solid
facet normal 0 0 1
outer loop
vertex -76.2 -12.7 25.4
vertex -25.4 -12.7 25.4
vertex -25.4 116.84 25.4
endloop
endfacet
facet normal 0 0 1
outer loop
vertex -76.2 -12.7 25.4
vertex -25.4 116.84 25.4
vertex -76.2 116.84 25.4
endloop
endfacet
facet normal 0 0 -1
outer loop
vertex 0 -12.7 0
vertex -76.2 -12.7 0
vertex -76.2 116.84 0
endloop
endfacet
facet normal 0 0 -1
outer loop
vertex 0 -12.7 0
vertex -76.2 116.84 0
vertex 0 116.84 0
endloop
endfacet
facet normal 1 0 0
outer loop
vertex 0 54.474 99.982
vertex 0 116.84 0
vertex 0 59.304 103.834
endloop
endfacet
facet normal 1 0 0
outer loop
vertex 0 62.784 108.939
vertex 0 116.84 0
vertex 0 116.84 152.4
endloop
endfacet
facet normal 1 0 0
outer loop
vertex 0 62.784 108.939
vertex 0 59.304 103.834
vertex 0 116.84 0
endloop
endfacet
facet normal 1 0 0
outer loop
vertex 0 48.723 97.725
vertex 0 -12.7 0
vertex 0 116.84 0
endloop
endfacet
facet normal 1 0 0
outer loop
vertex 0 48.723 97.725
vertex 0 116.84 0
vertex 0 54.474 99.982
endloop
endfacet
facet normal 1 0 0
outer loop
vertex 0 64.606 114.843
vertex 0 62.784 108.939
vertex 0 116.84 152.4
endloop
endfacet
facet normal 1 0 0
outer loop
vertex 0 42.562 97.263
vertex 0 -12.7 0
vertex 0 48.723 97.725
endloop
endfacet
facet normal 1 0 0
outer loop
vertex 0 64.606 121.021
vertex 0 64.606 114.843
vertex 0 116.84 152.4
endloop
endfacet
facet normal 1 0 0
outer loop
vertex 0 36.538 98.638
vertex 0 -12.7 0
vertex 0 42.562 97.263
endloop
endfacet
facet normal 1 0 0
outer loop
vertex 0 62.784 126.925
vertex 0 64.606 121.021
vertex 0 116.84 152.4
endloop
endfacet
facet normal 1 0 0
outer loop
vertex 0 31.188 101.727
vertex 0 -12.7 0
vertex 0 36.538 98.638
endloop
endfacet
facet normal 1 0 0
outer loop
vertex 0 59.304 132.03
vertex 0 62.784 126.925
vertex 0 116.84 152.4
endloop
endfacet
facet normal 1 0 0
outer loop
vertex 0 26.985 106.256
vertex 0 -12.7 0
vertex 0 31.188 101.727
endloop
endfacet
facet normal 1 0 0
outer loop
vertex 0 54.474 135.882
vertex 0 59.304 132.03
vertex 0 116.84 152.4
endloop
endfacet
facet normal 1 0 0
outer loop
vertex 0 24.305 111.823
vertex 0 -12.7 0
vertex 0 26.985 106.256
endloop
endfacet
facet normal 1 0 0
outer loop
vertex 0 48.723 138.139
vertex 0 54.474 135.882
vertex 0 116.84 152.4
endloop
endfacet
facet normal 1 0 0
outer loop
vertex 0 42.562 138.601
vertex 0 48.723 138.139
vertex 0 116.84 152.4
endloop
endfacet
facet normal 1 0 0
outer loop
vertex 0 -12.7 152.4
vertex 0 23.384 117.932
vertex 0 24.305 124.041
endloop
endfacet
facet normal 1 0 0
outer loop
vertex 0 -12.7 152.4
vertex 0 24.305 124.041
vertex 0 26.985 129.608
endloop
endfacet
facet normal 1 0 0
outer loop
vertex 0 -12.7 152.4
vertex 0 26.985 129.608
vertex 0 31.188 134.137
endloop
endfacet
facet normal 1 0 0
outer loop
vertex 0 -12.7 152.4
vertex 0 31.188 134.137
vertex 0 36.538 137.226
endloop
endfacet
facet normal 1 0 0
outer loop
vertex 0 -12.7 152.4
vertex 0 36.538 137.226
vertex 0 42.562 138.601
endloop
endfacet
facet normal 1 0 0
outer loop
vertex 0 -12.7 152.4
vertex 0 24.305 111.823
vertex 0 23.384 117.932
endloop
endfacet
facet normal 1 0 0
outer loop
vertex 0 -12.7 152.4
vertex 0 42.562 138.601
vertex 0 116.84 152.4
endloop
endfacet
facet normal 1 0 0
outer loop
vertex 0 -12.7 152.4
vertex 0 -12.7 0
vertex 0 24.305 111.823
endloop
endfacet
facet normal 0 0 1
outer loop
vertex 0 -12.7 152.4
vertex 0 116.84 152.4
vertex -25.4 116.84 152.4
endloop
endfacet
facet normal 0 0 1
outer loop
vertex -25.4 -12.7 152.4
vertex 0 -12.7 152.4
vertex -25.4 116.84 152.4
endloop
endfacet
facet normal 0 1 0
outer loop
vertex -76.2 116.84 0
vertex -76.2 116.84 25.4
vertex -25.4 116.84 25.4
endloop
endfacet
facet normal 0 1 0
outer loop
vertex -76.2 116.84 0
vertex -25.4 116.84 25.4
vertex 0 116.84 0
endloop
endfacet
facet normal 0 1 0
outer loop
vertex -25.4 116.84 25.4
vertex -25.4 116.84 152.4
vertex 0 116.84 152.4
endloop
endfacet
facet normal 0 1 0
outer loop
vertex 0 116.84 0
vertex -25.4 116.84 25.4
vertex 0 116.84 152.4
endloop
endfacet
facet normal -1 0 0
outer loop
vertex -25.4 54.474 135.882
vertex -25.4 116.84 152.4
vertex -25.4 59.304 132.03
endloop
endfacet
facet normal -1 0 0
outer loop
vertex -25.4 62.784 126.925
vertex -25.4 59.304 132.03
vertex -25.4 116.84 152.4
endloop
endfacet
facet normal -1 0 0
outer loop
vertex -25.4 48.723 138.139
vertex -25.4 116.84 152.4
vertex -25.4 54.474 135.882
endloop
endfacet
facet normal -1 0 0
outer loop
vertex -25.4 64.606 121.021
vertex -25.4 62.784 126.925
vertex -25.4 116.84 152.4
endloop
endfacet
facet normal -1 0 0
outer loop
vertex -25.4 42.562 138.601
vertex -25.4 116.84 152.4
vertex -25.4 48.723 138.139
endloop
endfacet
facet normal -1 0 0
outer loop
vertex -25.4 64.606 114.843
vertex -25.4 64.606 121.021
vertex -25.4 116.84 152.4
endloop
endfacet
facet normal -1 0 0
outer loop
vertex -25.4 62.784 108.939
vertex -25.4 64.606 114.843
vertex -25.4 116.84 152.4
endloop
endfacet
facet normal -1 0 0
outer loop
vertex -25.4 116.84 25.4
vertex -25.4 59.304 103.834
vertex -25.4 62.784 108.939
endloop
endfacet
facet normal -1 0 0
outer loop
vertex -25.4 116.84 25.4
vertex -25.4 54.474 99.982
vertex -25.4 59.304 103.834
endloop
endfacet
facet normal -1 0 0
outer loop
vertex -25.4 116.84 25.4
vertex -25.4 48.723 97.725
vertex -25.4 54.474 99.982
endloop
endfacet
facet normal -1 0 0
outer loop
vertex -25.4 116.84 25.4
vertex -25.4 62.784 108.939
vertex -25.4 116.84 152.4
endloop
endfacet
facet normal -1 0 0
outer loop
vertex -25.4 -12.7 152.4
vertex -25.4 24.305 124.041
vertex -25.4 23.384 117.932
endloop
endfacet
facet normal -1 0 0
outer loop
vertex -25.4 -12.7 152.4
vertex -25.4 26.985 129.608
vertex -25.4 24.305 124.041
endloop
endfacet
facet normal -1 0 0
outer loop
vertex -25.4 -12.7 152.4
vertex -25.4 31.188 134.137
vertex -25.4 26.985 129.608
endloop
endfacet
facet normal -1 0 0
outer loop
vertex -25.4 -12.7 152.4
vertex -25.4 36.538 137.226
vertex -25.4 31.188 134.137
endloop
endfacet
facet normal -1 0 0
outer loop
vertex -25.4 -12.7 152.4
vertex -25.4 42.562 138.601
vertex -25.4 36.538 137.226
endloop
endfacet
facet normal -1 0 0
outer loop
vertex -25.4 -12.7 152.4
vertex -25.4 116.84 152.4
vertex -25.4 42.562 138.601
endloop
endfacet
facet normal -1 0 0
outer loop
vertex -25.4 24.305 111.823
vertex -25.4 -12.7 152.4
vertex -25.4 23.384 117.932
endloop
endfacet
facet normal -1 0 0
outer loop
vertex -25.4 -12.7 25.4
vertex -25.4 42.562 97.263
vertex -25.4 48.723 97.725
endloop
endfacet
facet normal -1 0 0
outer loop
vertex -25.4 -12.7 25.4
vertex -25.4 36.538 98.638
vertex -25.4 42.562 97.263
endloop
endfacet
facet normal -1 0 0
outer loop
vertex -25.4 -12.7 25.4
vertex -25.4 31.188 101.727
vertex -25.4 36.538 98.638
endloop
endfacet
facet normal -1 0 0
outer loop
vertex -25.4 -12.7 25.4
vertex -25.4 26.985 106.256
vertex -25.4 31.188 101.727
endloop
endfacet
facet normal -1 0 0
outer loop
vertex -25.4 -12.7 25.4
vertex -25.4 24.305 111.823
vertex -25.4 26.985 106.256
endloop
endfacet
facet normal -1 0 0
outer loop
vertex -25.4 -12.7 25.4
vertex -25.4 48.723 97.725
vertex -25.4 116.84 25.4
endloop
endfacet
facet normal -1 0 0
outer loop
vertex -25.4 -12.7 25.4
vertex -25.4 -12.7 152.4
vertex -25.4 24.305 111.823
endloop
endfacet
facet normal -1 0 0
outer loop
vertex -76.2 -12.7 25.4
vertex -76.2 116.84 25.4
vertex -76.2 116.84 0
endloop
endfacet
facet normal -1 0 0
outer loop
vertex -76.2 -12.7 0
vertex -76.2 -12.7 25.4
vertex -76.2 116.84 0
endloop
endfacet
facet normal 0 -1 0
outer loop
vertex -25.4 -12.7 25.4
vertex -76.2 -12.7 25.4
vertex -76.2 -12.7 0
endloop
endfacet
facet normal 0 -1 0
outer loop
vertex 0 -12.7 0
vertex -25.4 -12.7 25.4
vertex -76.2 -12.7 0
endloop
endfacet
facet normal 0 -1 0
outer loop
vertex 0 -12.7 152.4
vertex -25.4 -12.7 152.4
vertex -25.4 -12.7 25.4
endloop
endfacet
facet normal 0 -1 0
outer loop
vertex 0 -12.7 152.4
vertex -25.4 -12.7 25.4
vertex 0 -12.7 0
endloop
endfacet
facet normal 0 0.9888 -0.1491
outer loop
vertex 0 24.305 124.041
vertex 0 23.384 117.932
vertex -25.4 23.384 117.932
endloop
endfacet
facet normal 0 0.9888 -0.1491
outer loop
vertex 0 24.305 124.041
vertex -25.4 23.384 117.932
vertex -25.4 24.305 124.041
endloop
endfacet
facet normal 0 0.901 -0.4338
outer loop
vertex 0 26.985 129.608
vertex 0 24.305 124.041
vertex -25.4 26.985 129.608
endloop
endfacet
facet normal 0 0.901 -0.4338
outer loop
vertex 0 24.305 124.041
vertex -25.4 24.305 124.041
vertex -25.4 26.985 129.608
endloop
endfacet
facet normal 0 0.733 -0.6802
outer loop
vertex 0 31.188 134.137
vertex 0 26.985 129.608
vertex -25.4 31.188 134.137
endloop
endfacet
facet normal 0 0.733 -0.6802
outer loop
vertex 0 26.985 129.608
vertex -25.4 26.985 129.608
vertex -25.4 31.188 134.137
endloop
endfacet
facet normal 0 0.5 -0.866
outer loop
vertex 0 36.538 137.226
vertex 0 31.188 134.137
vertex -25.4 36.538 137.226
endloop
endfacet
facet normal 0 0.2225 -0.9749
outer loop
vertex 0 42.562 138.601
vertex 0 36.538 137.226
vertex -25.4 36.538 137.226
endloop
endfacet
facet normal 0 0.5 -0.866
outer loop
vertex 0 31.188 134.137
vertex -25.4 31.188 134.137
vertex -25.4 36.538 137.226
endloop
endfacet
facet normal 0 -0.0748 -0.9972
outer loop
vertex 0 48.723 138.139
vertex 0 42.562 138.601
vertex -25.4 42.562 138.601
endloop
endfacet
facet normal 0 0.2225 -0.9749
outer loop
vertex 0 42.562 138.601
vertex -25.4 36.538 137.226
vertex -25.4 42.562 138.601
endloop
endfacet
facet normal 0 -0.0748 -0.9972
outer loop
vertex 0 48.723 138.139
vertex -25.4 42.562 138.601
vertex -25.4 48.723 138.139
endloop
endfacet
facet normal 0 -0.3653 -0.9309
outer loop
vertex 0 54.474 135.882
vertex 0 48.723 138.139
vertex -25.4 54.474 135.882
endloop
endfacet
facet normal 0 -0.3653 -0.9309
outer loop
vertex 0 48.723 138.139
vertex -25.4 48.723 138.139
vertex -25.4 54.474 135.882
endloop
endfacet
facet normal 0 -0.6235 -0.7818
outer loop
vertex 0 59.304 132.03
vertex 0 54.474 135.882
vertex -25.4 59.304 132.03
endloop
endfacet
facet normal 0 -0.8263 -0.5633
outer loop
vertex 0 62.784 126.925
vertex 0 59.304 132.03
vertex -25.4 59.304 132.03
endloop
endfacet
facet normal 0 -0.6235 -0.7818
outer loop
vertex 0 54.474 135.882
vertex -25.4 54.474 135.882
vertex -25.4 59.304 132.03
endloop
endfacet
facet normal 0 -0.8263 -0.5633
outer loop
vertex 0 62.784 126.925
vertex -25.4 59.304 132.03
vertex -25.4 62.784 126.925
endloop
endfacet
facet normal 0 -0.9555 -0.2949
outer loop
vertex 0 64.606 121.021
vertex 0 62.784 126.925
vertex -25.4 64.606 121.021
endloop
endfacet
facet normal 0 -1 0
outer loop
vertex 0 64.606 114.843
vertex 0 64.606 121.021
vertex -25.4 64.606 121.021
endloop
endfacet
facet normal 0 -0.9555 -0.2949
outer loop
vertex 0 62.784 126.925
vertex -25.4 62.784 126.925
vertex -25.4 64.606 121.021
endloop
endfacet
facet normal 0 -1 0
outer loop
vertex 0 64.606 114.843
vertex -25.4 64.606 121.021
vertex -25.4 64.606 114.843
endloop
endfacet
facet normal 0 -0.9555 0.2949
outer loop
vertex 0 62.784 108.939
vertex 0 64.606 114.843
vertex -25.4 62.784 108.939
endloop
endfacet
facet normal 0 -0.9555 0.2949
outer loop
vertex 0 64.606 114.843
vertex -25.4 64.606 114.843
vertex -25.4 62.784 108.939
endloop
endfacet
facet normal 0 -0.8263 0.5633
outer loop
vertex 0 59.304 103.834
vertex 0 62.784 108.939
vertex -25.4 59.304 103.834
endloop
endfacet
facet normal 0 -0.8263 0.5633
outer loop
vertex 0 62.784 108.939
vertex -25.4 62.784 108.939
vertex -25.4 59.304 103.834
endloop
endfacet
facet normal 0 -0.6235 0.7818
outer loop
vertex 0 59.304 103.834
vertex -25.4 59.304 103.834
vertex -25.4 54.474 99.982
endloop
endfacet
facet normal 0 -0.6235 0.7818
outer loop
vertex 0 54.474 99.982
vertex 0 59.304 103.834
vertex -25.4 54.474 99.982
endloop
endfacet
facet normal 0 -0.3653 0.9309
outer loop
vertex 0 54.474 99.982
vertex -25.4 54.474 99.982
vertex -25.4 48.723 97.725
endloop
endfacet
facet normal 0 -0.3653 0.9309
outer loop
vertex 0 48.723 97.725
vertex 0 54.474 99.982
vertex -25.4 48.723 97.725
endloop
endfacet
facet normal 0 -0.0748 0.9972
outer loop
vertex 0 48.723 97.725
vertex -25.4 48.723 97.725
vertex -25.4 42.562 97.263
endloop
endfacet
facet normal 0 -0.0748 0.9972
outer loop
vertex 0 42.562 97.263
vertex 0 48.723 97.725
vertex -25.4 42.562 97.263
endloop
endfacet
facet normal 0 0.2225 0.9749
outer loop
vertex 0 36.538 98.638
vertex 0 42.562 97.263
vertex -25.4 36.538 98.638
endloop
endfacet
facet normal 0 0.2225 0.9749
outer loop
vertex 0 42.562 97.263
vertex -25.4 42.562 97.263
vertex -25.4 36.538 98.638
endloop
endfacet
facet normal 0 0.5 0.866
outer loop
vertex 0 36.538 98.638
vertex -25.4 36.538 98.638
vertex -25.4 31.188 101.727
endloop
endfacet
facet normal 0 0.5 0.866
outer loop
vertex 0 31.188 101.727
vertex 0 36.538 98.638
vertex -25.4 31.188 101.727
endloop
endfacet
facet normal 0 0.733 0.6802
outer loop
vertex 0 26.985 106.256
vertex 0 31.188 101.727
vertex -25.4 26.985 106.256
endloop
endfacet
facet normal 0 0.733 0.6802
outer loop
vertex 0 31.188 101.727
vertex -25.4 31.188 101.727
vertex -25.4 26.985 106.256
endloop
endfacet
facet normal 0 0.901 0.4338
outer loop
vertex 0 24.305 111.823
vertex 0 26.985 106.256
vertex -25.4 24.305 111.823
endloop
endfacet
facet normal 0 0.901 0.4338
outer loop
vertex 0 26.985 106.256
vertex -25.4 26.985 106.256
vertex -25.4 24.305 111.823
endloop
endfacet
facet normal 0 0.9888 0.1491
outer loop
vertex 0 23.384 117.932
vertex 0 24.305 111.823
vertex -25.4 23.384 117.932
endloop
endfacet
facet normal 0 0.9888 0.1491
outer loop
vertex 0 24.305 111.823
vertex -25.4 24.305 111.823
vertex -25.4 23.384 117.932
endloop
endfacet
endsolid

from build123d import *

# Parameters (mm, degrees)
F1_DEPTH = 12.7
F2_DEPTH = 129.54
F3_R     = 20.726602
F4_DEPTH = 217.424


with BuildPart() as f1:
    # F0 (on Front) → F1 (new body, symmetric)
    with BuildSketch(Plane.XZ):
        Polygon((-76.2, 25.4), (-76.2, 0), (0, 0), (0, 152.4), (-25.4, 152.4), (-25.4, 25.4), align=None)
    extrude(amount=F1_DEPTH, both=True)

    # F1_face (on face) → F2 (join)
    with BuildSketch(Plane(origin=(-22.225, -12.7, 60.325), x_dir=(1, 0, 0), z_dir=(0, -1, 0))):
        Polygon((-53.975, -34.925), (-53.975, -60.325), (22.225, -60.325), (22.225, 92.075), (-3.175, 92.075), (-3.175, -34.925), align=None)
    extrude(amount=-F2_DEPTH)

    # F3 (on face) → F4 (cut, symmetric)
    with BuildSketch(Plane(origin=(-25.4, 0, 0), x_dir=(0, -1, 0), z_dir=(-1, 0, 0))):
        with Locations((-44.110455, 117.932089)):
            Circle(F3_R)
    extrude(amount=F4_DEPTH, both=True, mode=Mode.SUBTRACT)


solid = f1.part
